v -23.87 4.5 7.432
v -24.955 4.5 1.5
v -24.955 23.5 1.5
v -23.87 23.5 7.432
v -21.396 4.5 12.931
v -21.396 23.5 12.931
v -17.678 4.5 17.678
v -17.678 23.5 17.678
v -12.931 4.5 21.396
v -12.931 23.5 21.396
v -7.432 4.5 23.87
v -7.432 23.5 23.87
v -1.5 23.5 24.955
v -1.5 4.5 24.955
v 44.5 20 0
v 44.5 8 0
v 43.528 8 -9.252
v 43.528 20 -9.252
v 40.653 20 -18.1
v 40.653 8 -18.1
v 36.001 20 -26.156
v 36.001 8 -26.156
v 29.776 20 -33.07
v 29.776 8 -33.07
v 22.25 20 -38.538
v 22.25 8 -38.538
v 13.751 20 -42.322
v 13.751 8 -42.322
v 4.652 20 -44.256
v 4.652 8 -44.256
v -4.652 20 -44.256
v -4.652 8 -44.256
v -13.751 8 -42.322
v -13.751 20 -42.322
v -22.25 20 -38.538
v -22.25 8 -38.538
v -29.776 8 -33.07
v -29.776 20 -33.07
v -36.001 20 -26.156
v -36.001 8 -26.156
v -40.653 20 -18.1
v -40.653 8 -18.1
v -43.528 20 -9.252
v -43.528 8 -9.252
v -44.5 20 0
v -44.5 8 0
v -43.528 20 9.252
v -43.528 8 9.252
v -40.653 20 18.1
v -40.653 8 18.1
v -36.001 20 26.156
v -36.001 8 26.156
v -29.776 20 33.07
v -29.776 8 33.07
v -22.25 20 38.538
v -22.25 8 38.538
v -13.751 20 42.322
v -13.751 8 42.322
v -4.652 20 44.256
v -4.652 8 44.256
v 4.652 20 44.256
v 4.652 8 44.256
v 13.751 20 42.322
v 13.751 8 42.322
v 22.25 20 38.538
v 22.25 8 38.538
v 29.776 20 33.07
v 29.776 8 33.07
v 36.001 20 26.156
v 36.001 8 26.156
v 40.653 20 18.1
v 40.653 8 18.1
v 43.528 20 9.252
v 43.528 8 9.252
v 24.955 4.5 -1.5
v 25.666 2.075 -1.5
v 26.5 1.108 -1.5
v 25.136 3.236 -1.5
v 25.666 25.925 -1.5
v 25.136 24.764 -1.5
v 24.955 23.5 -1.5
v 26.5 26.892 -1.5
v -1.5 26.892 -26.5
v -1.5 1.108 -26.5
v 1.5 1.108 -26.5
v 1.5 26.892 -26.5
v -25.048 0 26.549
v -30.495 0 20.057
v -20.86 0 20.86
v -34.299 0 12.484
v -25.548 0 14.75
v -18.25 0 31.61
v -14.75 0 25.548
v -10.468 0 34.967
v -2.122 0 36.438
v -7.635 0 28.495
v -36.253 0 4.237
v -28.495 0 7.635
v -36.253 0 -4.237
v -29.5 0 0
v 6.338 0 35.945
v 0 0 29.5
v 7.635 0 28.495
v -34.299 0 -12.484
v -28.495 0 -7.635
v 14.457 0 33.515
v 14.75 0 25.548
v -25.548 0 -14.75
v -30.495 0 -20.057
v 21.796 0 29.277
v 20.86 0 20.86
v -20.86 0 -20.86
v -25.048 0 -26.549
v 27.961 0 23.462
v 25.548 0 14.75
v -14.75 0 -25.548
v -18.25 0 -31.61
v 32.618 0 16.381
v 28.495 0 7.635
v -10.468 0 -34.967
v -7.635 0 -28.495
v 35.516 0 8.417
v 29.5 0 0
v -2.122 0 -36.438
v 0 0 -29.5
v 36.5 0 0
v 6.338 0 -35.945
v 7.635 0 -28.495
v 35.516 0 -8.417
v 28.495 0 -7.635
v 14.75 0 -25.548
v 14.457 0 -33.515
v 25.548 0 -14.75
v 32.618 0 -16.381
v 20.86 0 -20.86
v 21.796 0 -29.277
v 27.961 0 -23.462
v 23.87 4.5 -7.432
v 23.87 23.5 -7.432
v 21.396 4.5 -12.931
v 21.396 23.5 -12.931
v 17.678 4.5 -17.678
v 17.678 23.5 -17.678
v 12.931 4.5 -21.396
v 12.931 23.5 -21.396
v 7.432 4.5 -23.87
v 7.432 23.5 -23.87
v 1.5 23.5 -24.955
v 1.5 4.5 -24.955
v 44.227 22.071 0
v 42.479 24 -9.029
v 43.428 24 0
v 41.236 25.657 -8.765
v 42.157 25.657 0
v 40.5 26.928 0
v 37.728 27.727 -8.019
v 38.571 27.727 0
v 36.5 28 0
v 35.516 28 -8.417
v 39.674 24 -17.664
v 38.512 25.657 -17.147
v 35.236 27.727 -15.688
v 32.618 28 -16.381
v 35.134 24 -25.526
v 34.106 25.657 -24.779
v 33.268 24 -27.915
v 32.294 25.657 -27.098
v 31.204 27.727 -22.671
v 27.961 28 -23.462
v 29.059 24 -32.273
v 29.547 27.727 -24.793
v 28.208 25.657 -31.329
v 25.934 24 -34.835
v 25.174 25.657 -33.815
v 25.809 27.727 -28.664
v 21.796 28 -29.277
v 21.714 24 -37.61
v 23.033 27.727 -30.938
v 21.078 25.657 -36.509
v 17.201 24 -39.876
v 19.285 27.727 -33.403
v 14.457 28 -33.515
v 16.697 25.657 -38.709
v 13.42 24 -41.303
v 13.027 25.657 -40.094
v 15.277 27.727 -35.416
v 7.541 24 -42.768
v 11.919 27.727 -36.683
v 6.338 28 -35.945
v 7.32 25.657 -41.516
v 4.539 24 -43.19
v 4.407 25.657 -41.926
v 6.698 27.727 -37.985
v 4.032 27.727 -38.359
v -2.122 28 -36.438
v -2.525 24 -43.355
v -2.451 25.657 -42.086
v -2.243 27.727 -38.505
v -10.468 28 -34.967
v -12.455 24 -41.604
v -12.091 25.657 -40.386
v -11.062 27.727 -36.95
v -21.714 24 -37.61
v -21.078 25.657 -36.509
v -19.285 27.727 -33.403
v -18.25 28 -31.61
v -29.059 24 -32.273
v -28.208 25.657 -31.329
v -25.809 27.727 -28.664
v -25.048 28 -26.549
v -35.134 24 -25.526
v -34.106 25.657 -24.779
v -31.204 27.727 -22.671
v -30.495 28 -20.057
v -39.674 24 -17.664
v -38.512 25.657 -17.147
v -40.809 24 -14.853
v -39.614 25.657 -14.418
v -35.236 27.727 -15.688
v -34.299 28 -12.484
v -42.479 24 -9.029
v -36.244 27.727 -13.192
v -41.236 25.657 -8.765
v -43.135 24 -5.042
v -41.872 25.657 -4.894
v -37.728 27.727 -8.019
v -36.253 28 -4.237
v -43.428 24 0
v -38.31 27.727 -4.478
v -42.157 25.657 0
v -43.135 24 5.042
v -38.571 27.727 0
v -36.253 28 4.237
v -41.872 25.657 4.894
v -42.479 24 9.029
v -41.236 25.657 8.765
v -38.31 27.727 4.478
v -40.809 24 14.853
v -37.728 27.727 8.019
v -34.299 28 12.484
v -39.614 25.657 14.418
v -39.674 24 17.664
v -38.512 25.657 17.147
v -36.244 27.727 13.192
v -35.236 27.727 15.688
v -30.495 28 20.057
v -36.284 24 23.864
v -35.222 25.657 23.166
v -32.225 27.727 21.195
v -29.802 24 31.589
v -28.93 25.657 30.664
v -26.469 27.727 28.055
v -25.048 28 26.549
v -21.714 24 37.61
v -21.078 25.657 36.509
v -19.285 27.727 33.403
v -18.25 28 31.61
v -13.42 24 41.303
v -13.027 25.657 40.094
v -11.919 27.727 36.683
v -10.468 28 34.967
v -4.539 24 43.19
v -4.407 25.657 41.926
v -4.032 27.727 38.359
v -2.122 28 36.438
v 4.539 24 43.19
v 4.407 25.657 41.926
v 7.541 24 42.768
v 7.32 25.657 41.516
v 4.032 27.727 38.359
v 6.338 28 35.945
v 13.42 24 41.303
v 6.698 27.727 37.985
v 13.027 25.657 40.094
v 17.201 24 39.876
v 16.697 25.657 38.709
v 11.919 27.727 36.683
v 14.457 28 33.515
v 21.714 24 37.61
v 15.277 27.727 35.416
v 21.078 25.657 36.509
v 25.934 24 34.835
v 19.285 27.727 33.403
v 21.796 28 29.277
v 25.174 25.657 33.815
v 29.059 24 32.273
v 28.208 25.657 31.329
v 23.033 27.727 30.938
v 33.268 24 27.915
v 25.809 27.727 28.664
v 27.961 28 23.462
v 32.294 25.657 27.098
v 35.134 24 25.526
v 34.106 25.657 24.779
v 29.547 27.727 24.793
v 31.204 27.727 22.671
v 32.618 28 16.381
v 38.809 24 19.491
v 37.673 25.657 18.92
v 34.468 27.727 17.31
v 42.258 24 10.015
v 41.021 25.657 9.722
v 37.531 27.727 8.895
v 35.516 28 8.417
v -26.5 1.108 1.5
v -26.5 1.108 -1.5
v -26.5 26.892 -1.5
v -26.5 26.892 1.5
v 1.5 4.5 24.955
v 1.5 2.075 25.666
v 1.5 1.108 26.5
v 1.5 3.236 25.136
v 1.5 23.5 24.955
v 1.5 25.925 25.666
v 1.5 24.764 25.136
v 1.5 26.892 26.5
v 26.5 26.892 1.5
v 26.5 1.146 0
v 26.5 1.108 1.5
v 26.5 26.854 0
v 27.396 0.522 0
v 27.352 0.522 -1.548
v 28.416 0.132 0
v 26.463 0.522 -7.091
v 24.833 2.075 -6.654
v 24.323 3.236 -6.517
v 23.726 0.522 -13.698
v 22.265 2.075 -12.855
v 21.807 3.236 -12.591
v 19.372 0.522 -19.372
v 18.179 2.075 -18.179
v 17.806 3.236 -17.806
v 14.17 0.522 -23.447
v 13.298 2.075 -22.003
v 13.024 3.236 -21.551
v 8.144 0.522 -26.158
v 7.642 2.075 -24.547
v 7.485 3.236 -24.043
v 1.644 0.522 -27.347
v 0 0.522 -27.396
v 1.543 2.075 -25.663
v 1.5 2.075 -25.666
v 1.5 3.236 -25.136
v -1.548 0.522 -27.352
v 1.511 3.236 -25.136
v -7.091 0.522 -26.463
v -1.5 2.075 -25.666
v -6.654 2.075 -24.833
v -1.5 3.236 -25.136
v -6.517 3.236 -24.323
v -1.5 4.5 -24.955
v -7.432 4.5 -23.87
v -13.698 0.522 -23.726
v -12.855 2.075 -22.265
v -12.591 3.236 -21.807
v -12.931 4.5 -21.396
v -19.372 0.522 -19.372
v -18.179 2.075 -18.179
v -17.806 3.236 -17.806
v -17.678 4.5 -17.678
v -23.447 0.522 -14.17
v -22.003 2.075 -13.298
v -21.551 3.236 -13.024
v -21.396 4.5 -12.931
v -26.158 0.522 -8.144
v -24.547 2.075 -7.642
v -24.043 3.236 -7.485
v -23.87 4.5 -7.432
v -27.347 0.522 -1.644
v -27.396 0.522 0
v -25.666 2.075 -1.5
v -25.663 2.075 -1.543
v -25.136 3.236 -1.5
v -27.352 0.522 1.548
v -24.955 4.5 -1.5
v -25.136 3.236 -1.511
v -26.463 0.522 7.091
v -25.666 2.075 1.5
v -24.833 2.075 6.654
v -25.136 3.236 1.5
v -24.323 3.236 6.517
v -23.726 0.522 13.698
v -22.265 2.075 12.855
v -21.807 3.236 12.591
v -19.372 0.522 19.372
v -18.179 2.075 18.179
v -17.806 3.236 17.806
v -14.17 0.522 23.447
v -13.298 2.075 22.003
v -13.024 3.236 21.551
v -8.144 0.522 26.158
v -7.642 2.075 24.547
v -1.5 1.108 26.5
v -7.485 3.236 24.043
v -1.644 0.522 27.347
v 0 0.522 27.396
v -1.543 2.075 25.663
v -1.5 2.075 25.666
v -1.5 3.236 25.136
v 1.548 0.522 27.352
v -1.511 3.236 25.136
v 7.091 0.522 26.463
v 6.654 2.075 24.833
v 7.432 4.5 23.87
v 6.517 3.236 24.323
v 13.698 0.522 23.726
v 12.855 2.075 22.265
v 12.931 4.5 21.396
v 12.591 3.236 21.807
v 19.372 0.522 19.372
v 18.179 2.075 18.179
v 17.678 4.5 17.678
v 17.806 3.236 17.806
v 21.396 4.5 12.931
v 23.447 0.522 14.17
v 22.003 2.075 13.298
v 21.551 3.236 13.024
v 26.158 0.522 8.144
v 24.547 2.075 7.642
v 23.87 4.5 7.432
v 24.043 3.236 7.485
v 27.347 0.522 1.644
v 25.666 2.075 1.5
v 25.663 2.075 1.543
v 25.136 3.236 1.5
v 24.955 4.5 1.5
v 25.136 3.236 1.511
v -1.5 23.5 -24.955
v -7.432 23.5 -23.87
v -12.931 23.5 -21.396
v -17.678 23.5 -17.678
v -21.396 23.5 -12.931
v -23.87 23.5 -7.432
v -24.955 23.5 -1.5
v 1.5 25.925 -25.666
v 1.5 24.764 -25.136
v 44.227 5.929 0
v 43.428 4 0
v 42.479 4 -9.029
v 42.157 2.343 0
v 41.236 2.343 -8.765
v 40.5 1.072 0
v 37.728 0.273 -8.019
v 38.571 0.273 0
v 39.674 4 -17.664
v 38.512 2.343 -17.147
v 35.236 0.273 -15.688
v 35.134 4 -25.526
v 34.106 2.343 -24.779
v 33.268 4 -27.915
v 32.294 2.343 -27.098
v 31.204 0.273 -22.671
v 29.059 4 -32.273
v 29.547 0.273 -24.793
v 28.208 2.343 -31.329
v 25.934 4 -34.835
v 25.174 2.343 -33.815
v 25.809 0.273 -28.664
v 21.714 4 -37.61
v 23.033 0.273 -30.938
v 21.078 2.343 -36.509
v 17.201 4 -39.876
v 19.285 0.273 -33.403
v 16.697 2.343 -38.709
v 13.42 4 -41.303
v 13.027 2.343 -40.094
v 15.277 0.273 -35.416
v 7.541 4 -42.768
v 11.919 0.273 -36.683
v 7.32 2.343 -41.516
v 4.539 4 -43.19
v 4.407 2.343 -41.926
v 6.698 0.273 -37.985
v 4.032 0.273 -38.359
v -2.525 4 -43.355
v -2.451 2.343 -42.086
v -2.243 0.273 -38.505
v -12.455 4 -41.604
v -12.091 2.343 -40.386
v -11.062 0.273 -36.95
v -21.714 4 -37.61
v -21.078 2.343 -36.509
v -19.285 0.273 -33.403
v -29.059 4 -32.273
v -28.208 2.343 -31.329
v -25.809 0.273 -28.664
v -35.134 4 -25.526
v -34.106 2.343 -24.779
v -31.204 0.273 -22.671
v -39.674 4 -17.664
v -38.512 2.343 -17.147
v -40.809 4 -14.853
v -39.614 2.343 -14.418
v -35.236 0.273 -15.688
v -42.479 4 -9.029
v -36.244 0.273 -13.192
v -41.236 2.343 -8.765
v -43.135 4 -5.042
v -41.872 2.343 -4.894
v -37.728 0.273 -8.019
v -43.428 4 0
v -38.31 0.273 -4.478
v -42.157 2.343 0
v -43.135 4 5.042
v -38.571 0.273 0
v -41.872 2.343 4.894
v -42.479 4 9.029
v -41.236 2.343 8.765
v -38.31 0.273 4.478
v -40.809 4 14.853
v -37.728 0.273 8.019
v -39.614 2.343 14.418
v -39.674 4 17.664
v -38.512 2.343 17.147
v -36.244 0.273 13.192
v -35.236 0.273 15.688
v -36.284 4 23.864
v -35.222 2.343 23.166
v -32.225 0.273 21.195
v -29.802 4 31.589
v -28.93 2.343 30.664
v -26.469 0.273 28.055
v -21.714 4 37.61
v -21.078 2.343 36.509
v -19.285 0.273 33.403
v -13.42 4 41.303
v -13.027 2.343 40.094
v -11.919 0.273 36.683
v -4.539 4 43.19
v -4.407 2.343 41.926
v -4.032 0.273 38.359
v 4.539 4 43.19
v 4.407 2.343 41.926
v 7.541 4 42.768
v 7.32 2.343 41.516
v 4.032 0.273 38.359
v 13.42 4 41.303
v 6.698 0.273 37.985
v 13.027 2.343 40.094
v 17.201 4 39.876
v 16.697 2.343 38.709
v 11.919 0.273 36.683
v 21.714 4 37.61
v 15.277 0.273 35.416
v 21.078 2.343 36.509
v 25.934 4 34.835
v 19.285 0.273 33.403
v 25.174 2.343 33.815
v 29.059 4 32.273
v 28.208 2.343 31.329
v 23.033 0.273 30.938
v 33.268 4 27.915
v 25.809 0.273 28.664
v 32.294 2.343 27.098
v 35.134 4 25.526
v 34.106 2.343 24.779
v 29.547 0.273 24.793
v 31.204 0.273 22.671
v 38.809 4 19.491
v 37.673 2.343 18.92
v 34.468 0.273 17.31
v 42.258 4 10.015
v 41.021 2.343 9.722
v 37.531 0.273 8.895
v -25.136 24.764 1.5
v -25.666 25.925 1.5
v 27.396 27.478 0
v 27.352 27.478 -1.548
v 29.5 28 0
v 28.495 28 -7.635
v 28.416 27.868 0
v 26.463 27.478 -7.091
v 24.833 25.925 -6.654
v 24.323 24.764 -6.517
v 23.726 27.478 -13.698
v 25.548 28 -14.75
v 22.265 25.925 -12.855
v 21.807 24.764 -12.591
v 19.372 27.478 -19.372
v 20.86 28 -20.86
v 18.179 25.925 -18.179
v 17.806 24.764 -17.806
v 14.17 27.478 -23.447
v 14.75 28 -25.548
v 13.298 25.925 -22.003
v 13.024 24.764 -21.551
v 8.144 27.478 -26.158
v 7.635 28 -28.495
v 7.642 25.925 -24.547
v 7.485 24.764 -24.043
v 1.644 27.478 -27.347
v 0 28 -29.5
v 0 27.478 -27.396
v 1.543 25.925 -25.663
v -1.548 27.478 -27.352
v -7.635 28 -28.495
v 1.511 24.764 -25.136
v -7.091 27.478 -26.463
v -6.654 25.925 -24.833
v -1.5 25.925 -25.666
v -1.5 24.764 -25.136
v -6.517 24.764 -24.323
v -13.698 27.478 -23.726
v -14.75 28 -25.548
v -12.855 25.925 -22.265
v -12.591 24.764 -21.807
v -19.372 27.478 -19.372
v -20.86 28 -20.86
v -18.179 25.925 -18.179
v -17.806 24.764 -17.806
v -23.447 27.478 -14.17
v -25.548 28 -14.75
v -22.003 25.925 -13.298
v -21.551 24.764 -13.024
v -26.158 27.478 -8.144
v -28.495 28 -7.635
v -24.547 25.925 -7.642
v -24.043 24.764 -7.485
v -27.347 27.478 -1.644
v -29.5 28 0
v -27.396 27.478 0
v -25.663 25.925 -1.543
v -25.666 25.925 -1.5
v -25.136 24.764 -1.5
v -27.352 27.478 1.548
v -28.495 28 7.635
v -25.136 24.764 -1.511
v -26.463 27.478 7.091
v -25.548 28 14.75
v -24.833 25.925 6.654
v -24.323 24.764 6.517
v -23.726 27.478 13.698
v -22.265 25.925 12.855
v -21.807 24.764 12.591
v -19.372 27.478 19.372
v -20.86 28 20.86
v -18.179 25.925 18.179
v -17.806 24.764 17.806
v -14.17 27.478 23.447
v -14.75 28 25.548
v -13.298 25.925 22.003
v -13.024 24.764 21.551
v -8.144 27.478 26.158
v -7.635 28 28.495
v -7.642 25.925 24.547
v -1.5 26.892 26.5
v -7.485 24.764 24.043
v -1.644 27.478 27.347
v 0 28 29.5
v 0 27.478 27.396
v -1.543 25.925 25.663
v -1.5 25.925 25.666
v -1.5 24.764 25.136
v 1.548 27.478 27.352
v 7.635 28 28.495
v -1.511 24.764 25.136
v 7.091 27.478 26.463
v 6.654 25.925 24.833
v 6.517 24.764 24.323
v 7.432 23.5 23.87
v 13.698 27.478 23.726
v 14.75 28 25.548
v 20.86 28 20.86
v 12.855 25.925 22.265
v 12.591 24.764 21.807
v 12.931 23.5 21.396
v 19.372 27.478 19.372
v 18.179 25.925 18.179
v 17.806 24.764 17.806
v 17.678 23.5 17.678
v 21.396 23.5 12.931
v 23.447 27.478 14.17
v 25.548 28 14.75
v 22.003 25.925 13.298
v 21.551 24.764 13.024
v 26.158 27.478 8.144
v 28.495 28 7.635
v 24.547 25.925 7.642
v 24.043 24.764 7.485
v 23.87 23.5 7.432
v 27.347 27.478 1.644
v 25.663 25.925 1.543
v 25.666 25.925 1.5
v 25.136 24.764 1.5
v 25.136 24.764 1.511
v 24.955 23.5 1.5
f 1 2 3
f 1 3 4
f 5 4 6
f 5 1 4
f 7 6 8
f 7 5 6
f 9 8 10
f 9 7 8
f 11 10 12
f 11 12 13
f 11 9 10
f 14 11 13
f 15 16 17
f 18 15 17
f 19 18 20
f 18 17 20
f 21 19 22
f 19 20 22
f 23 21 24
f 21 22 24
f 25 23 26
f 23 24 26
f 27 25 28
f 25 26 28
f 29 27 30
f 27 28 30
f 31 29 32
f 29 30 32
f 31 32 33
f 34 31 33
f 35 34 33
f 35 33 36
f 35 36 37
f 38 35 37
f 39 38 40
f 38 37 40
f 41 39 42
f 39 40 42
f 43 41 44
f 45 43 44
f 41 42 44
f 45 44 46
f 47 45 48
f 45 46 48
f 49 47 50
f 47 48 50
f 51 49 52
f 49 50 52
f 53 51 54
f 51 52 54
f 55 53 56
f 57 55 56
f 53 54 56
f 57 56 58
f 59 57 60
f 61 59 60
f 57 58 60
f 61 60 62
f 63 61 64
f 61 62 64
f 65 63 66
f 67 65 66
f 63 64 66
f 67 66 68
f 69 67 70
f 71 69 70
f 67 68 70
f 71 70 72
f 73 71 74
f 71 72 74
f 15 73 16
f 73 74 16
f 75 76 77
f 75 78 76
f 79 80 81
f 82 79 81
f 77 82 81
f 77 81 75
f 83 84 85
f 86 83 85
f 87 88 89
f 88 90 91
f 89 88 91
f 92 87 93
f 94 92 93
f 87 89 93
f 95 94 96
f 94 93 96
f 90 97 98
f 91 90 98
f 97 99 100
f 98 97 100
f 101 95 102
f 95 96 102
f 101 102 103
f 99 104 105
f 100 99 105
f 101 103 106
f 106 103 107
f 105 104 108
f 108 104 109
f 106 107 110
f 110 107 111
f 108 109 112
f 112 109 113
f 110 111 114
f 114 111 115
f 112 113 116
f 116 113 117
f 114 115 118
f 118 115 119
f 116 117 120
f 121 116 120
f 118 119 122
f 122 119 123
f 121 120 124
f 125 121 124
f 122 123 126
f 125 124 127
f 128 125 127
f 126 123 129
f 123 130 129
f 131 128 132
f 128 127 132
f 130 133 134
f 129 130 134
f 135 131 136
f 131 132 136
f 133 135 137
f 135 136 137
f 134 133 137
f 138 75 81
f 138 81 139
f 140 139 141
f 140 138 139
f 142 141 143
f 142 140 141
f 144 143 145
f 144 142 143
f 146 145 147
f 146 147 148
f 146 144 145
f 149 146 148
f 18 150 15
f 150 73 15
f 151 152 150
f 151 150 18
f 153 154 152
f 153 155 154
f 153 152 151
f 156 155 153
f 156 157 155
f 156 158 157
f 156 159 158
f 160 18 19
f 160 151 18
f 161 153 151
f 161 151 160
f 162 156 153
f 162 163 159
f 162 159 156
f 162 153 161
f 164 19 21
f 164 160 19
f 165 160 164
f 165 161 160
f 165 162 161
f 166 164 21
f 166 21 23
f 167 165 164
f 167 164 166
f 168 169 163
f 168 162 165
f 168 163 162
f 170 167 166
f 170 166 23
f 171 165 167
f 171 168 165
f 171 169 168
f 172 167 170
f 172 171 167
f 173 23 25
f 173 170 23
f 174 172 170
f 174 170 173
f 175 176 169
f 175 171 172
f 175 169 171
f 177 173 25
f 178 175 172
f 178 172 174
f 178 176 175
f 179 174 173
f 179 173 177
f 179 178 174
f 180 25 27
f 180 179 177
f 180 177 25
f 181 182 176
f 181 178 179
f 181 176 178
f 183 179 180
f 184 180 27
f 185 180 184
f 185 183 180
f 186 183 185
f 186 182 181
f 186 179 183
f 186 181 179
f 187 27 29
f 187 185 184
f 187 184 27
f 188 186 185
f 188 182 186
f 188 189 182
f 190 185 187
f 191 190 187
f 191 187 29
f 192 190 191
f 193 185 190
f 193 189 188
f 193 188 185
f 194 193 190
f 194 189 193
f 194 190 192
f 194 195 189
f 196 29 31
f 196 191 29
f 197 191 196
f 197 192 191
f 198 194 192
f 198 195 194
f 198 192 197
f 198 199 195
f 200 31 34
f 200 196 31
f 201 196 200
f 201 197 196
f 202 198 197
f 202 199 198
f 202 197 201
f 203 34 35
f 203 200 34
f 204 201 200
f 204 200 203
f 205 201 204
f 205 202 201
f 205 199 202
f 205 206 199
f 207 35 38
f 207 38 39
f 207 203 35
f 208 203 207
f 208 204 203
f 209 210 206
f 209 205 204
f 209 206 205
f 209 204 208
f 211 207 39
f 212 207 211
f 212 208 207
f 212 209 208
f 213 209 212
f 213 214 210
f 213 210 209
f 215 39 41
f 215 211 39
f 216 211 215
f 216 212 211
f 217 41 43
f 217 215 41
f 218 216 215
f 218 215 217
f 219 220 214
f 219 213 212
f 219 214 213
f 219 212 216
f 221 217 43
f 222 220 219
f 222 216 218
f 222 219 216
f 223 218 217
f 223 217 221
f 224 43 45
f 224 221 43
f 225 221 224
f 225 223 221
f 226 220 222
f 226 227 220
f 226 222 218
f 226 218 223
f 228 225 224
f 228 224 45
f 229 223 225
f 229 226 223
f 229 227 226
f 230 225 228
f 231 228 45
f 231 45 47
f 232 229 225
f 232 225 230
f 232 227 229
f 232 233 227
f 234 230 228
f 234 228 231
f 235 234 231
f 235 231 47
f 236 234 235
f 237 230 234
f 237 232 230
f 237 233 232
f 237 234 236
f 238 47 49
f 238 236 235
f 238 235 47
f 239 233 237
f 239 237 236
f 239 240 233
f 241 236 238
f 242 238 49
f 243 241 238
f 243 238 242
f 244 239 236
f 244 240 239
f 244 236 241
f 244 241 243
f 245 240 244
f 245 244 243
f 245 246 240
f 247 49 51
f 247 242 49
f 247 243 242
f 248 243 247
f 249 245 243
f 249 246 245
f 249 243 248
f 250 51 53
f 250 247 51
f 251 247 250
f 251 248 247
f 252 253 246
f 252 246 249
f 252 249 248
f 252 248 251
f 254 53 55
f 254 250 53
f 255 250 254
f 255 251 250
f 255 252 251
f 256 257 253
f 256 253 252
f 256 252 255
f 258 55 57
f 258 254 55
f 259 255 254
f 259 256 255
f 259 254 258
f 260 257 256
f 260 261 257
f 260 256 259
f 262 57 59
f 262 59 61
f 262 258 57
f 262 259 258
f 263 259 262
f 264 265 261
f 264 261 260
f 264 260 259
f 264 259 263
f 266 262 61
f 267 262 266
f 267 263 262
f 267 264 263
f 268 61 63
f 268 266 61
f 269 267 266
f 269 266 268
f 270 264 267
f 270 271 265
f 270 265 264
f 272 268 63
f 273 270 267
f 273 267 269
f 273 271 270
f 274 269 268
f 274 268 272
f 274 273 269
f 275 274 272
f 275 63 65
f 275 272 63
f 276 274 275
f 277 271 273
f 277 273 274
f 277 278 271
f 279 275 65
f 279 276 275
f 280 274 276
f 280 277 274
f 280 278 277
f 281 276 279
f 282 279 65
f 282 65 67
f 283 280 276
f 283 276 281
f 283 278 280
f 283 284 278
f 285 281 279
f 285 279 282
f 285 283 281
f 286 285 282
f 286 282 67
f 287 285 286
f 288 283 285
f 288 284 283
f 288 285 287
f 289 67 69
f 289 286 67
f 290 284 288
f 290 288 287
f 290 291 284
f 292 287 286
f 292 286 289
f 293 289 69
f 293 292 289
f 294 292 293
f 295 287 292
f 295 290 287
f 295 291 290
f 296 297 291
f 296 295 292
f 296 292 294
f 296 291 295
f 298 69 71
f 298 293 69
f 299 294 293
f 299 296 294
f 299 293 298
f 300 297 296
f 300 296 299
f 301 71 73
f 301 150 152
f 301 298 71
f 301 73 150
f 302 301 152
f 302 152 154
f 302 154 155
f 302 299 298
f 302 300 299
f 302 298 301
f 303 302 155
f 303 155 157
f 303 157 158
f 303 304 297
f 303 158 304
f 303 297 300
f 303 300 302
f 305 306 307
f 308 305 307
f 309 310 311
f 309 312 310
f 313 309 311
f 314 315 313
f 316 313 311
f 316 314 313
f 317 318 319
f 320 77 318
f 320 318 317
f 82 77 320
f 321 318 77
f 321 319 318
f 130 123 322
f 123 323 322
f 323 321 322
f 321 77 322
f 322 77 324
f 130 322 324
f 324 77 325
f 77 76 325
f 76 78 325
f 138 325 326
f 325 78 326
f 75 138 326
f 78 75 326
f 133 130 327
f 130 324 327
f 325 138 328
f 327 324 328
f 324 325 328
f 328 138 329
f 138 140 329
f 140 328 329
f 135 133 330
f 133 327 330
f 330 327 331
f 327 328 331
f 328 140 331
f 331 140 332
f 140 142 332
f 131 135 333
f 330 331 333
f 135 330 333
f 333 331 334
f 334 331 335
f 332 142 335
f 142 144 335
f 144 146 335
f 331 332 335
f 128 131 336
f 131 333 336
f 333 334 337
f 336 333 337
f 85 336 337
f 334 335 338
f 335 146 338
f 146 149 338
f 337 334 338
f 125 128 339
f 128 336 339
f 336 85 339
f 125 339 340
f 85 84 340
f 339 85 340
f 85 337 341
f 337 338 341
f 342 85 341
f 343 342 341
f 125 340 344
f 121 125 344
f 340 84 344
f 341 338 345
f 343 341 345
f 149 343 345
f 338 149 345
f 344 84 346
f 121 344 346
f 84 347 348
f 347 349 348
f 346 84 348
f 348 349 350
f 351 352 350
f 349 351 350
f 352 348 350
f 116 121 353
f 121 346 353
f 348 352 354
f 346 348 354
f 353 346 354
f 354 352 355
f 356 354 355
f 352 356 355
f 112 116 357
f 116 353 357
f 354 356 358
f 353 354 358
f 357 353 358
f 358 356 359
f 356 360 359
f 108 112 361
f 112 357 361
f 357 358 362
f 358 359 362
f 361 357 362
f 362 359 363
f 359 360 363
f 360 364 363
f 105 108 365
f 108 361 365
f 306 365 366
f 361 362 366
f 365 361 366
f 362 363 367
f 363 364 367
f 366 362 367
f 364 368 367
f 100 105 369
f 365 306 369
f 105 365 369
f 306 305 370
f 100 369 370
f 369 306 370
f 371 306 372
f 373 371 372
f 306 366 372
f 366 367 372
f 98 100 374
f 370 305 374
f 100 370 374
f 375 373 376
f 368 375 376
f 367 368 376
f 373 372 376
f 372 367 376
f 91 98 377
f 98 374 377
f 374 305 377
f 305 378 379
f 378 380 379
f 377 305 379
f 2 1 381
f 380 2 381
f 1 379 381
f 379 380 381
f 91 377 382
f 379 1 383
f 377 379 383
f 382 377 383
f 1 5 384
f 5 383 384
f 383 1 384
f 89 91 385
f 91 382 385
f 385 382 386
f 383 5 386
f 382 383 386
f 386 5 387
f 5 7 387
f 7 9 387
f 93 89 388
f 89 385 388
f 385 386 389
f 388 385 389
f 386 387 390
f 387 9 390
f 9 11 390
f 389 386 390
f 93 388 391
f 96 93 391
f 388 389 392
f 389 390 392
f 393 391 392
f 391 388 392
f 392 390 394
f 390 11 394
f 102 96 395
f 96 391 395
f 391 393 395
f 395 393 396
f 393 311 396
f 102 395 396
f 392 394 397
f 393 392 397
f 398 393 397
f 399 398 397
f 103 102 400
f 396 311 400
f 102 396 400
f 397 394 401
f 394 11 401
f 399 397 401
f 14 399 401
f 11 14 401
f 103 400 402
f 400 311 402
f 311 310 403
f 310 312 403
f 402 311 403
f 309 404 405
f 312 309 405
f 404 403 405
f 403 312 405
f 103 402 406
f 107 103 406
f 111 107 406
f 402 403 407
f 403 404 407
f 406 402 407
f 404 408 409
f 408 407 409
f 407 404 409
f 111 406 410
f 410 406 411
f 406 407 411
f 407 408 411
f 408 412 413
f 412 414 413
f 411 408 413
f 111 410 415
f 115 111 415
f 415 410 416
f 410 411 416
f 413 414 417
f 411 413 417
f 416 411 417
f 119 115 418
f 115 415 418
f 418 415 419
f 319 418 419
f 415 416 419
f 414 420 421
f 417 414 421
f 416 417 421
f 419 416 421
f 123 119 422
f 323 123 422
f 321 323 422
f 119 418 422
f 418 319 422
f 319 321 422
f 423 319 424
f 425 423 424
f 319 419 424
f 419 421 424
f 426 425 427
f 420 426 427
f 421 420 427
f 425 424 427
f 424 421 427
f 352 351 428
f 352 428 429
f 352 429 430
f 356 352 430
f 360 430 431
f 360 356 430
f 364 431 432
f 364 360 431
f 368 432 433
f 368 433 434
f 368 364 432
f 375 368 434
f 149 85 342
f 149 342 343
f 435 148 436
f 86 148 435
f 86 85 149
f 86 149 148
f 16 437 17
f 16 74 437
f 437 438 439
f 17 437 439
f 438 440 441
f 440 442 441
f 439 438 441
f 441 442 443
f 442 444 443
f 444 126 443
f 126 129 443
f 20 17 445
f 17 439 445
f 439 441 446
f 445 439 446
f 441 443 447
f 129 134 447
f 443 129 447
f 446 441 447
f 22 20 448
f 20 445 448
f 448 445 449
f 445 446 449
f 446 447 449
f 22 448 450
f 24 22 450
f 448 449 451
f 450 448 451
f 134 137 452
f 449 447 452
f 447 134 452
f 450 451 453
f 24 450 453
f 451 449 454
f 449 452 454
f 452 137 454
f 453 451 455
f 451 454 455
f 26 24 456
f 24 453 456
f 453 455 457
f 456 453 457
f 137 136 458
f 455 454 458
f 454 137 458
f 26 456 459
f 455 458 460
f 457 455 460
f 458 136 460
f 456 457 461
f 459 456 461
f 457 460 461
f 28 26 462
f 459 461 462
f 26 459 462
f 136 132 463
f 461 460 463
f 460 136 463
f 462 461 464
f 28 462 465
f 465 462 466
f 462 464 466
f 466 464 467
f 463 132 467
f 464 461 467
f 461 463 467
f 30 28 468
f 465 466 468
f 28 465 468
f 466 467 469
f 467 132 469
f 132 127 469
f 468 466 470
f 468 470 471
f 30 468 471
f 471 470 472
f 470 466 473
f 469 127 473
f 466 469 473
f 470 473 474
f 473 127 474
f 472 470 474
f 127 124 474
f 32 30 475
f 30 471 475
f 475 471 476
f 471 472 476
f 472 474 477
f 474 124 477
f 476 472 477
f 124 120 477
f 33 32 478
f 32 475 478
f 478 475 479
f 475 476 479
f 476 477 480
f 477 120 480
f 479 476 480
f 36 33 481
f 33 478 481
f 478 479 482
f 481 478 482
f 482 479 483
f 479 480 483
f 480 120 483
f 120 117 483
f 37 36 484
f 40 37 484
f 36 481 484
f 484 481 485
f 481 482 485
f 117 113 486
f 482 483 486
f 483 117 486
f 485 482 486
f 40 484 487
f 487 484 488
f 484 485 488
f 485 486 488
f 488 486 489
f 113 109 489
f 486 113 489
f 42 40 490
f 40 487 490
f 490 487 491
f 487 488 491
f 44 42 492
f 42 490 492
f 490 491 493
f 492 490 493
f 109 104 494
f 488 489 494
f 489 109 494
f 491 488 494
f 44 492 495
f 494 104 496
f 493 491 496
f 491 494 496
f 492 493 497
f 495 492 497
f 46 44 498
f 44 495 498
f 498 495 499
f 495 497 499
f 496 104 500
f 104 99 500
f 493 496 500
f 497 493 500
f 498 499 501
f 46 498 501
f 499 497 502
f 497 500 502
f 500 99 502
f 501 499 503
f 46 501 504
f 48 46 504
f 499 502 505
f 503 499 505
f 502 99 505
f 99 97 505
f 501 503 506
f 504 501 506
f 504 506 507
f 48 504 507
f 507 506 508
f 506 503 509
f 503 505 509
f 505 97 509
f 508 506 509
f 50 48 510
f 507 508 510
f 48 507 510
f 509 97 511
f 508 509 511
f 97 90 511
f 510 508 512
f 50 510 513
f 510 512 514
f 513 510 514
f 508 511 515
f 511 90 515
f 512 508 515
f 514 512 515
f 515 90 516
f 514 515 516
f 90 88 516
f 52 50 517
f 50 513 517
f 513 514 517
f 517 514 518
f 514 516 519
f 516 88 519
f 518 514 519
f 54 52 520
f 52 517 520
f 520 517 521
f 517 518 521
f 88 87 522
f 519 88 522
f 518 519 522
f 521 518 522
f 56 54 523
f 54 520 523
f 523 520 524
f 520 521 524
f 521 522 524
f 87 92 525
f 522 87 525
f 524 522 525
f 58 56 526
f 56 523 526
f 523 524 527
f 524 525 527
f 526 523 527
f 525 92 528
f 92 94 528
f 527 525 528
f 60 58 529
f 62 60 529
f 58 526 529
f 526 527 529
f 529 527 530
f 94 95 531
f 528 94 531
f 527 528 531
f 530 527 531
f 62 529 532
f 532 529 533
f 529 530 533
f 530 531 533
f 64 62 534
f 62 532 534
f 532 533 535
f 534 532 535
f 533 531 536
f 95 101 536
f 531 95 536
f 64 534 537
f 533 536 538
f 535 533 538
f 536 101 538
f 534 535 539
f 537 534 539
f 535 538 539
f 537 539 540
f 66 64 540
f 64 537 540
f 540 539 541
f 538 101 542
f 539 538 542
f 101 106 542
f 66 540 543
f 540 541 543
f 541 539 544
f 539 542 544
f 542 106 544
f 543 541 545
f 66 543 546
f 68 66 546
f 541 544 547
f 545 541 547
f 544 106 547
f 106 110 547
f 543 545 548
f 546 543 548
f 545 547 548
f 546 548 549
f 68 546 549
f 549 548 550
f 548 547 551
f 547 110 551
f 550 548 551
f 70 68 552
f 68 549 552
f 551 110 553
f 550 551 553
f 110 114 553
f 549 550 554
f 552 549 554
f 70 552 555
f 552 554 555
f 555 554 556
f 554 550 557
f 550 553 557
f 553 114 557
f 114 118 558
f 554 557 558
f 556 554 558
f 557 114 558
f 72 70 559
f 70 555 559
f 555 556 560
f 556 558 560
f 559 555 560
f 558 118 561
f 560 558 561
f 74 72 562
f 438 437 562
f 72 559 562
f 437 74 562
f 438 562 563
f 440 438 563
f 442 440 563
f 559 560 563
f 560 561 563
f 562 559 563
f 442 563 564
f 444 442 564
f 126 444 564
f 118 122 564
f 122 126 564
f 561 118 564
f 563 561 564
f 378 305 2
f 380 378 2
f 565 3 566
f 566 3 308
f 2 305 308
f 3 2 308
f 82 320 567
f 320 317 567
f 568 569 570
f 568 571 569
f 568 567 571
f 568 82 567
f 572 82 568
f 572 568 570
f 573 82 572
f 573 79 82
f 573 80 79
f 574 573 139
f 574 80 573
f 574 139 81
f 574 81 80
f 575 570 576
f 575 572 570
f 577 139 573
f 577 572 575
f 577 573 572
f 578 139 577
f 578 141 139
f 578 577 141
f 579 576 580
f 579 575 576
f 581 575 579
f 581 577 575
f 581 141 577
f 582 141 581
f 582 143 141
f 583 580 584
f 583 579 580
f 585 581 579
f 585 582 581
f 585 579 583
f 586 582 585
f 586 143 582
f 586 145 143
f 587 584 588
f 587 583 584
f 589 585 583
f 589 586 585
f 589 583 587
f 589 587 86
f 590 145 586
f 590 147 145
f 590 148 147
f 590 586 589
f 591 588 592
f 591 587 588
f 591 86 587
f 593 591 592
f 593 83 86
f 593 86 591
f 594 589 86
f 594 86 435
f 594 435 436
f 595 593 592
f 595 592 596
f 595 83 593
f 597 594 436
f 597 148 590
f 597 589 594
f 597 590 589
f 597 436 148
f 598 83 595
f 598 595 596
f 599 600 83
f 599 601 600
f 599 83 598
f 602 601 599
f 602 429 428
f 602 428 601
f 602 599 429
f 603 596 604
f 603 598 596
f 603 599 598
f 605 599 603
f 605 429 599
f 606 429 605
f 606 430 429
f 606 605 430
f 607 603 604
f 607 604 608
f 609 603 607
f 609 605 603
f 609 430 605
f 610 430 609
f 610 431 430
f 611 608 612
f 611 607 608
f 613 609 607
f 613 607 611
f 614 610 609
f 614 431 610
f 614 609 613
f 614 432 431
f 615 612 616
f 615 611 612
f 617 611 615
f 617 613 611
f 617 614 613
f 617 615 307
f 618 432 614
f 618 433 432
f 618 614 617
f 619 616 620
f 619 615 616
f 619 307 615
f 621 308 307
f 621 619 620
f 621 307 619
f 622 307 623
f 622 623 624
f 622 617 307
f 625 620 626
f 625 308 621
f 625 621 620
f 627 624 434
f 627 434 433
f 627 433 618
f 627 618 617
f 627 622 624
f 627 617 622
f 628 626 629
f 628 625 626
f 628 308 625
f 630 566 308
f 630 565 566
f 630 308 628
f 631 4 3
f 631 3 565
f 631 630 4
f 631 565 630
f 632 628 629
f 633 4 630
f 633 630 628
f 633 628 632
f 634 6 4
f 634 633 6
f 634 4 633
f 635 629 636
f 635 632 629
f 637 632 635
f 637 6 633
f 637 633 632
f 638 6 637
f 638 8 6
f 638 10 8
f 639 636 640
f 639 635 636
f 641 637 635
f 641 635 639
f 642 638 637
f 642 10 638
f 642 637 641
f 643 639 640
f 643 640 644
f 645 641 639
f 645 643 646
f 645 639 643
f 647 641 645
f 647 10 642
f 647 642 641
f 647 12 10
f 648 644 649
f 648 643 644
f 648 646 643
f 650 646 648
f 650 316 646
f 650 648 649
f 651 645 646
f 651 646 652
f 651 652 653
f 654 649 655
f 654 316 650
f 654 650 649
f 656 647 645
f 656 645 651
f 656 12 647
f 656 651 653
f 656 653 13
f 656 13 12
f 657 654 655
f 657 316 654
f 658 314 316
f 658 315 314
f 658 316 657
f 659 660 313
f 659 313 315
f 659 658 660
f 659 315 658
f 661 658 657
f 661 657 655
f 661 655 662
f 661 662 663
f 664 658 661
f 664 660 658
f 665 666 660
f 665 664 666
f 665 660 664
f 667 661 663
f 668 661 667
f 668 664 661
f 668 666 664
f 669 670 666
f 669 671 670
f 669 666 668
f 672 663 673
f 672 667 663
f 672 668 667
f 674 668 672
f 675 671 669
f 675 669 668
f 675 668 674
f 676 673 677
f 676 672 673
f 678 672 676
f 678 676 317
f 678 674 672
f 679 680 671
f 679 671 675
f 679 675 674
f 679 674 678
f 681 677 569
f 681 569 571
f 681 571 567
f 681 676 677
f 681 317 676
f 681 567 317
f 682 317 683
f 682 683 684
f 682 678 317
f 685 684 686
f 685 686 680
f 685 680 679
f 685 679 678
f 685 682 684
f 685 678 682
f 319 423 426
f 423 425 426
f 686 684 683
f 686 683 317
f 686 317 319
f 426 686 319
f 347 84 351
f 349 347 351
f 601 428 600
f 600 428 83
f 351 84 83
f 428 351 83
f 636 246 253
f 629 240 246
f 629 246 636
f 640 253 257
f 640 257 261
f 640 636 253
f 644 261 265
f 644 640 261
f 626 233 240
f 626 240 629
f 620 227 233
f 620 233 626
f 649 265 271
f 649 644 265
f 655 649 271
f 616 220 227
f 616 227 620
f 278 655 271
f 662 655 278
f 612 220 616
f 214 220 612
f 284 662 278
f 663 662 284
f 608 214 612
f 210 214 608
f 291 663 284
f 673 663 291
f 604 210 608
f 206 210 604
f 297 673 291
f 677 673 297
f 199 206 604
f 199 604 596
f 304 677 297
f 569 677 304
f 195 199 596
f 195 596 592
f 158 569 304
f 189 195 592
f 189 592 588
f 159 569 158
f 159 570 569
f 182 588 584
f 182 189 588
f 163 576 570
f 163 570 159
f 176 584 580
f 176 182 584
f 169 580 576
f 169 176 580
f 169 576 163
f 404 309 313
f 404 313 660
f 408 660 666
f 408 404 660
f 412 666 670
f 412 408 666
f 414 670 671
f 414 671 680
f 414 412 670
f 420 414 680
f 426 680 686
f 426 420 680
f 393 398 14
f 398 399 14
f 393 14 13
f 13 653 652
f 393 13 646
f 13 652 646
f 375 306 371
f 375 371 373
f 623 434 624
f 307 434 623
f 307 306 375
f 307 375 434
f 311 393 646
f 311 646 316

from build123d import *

# Parameters (mm, degrees)
BOX357_W          = 53
BOX357_H          = 30
BOX357_DEPTH      = 3
BOX358_W          = 3
BOX358_H          = 30
BOX358_DEPTH      = 53
CYLINDER020_R     = 25
CYLINDER020_DEPTH = 28
CYLINDER018_R     = 44.5
CYLINDER018_DEPTH = 28
FILLET007_R       = 8
FILLET009_R       = 4.5


with BuildPart() as cube357:
    # Box357 → Box357 (new body)
    with BuildSketch(Plane(origin=(-26.5, 1, -1.5), x_dir=(1, 0, 0), z_dir=(0, 0, 1))):
        with Locations((26.5, 15)):
            Rectangle(BOX357_W, BOX357_H)
    extrude(amount=BOX357_DEPTH)


with BuildPart() as fusion013:
    # Box358 → Box358 (new body)
    with BuildSketch(Plane(origin=(-1.5, 1, -26.5), x_dir=(1, 0, 0), z_dir=(0, 0, 1))):
        with Locations((1.5, 15)):
            Rectangle(BOX358_W, BOX358_H)
    extrude(amount=BOX358_DEPTH)

    # Fusion013: union Cube357
    add(cube357.part)


with BuildPart() as cylinder020:
    # Cylinder020 → Cylinder020 (new body)
    with BuildSketch(Plane(origin=(0, 0, 0), x_dir=(1, 0, 0), z_dir=(0, 1, 0))):
        Circle(CYLINDER020_R)
    extrude(amount=CYLINDER020_DEPTH)


with BuildPart() as rear_wheel_inner:
    # Cylinder018 → Cylinder018 (new body)
    with BuildSketch(Plane(origin=(0, 0, 0), x_dir=(1, 0, 0), z_dir=(0, 1, 0))):
        Circle(CYLINDER018_R)
    extrude(amount=CYLINDER018_DEPTH)

    # Fillet007
    fillet007_edges = [rear_wheel_inner.edges().sort_by_distance(p)[0] for p in [
        (-44.5, 0, 0),
        (-44.5, 28, 0),
    ]]
    fillet(fillet007_edges, radius=FILLET007_R)

    # Cut004026018020018: cut Cylinder020
    add(cylinder020.part, mode=Mode.SUBTRACT)

    # Fillet009
    fillet009_edges = [rear_wheel_inner.edges().sort_by_distance(p)[0] for p in [
        (-25, 28, 0),
        (-25, 0, 0),
    ]]
    fillet(fillet009_edges, radius=FILLET009_R)

    # Cut004026018020019: cut Fusion013
    add(fusion013.part, mode=Mode.SUBTRACT)


solid = rear_wheel_inner.part
